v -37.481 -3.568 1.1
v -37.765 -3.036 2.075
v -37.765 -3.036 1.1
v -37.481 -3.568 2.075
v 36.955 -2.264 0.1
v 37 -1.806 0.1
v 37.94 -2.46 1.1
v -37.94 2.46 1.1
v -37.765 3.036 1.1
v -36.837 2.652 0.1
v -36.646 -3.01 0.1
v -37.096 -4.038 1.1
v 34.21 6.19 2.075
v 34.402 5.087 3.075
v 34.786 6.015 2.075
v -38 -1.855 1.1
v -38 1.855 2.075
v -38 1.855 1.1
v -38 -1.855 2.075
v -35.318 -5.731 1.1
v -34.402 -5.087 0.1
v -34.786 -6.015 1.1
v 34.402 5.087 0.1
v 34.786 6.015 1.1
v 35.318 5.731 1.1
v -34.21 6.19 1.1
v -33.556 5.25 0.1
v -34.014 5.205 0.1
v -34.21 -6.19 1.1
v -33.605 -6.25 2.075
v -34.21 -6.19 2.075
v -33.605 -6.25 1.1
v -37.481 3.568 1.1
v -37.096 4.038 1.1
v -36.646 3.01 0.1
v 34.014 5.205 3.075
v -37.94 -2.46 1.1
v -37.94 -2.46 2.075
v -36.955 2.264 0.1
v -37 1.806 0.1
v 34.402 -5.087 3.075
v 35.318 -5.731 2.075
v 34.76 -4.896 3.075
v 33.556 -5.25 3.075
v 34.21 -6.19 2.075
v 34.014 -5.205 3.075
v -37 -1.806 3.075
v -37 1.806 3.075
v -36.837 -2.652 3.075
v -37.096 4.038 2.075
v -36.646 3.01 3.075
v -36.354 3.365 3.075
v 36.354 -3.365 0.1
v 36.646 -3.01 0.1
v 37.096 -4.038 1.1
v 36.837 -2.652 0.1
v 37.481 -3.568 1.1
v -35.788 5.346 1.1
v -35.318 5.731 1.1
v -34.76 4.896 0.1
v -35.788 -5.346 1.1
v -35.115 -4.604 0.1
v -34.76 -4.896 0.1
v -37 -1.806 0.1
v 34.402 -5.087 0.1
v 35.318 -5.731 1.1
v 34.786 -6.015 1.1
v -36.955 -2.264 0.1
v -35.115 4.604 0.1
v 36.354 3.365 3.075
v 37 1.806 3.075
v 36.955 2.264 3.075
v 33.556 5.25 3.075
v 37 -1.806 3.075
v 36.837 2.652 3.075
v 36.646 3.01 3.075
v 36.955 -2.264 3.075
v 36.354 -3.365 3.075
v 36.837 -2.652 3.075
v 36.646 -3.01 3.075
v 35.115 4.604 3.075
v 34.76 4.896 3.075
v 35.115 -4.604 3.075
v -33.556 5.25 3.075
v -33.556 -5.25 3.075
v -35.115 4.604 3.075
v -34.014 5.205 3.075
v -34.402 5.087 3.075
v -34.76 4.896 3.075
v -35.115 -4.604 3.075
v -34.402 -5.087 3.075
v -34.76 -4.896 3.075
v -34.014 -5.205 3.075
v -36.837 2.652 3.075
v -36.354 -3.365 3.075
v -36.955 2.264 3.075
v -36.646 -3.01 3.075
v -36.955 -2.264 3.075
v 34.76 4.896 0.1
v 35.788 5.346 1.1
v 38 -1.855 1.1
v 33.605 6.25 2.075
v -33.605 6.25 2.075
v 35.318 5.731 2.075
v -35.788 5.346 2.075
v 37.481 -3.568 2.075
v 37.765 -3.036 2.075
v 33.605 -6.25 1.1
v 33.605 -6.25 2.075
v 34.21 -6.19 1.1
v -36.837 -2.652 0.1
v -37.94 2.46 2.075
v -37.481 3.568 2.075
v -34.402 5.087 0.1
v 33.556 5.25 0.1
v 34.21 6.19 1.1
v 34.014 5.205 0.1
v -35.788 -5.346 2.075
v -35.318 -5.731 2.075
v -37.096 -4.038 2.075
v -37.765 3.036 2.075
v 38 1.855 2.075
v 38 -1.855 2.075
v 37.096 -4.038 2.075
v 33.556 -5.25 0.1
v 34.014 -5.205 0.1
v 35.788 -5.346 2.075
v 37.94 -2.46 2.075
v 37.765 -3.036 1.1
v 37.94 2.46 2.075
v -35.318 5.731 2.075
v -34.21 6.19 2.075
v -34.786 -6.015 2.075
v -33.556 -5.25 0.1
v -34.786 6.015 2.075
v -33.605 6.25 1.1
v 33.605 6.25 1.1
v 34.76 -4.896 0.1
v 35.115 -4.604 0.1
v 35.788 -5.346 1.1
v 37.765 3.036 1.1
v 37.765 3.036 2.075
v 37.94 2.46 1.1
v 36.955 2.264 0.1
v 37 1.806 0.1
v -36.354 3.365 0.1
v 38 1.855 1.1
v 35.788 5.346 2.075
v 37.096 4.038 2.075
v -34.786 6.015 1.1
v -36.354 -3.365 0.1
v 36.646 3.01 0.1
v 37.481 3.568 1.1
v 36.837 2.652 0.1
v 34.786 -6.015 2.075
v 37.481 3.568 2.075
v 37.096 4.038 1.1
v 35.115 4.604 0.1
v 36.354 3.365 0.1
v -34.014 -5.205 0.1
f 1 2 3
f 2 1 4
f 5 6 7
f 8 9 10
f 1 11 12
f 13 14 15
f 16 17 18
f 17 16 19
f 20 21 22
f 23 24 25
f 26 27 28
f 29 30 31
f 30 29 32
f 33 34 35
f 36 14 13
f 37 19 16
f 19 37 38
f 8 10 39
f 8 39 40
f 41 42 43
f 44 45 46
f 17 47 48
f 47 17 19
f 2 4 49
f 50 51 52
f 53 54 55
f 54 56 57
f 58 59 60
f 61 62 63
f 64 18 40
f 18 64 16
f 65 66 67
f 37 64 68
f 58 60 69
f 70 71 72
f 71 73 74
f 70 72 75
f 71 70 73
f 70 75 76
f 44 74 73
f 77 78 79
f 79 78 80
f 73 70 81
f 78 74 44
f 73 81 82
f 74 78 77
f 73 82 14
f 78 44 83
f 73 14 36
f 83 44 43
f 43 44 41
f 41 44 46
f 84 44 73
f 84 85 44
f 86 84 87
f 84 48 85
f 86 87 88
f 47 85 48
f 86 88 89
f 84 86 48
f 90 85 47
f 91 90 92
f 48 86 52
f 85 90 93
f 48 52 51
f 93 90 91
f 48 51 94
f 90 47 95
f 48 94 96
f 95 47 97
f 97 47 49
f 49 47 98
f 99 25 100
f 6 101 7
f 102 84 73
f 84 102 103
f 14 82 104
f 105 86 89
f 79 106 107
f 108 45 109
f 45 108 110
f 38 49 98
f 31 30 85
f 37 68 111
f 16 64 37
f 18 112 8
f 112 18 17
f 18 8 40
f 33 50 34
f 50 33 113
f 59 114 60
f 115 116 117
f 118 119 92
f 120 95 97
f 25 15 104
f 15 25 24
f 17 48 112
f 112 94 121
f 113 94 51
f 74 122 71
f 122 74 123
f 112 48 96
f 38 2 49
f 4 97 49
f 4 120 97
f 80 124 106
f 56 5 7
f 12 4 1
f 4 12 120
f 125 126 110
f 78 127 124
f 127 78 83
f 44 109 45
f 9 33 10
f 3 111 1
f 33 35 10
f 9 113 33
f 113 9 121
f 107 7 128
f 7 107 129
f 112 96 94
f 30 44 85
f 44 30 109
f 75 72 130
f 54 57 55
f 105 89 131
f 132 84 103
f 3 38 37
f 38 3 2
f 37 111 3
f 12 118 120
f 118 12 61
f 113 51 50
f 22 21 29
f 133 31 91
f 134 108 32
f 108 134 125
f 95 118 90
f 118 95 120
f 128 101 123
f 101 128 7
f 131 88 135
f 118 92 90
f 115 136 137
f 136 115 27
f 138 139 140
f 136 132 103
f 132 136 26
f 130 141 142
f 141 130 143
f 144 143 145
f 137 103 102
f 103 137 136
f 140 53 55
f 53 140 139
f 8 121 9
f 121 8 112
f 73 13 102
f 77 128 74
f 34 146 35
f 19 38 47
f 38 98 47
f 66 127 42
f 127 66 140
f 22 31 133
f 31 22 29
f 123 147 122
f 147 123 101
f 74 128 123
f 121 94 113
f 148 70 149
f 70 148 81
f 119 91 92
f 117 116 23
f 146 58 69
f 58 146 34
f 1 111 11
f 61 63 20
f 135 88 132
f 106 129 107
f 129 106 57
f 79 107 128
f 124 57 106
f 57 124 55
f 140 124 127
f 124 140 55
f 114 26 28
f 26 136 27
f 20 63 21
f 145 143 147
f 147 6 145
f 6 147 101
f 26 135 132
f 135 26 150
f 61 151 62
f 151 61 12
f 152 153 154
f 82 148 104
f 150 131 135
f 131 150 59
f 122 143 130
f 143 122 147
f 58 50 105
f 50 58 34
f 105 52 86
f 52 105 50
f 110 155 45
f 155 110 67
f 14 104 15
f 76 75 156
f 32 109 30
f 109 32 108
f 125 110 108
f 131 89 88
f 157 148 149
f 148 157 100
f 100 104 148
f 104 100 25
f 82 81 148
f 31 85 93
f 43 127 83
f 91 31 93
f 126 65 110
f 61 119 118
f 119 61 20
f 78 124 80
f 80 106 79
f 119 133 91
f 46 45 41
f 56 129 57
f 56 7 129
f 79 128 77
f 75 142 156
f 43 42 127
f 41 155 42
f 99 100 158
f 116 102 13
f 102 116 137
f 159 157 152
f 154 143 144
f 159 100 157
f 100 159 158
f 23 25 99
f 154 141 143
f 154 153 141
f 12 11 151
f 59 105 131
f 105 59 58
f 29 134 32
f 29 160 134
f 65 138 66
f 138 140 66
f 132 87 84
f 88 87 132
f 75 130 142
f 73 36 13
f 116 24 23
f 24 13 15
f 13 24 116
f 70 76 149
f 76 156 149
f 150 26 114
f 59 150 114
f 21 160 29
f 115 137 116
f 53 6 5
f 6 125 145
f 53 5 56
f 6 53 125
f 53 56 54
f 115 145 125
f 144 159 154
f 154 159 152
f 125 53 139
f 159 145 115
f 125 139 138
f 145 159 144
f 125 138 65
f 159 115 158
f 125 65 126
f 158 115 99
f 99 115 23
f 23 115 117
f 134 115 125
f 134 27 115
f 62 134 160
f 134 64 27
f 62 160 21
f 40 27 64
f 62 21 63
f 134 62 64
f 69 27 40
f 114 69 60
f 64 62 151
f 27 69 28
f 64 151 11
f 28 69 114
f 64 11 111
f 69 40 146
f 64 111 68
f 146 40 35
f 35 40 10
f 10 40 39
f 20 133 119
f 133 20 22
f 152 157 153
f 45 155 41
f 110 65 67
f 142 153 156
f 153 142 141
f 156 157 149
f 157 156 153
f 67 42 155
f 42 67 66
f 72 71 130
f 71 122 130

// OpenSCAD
size = ["3inch", "1/2inch", "1/8inch"];

edge_bevel = "1mm";
corner_bevel = "1/8inch";

bowtie_cutout_style = "none"; // ["none","round"]
bowtie_offset = -0.10; // 0.025

$tgx11_offset = -0.1;
$fn = 36;

module edgespacer0__end_params() { }

use <../lib/RoundBowtie0.scad>
use <../lib/TGx11.1Lib.scad>
use <../lib/TOGMod1.scad>
use <../lib/TOGMod1Constructors.scad>
use <../lib/TOGPath1.scad>
use <../lib/TOGPolyhedronLib1.scad>
use <../lib/TOGUnits1.scad>
use <../lib/TOGVecLib0.scad>

$togridlib3_unit_table = tgx11_get_default_unit_table();

bowtie_cutout_2d =
	bowtie_cutout_style == "none" ? ["union"] :
	roundbowtie0_make_bowtie_2d(6.35, offset=-bowtie_offset);

size_mm = togunits1_decode_vec(size);
vbev = togunits1_decode(edge_bevel);
hbev = min(size_mm[0]*96/128, size_mm[1]*96/128, togunits1_decode(corner_bevel));
hround = hbev;

block_hull = tphl1_make_polyhedron_from_layer_function([
	[           0   -$tgx11_offset, -vbev],
	[           vbev-$tgx11_offset,  0],
   [size_mm[2]-vbev+$tgx11_offset,  0],
	[size_mm[2]     +$tgx11_offset, -vbev],
], function(zo) togvec0_offset_points(
	togpath1_rath_to_polypoints(
		togpath1_make_rectangle_rath(
			[size_mm[0], size_mm[1]],
			[["bevel", hbev], ["round", hround], ["offset", zo[1] + $tgx11_offset]]
		)
	),
	zo[0]
));

btatom = 12.7;
approximate_size_btatoms = [for(s=size_mm) round(s/btatom)];

togmod1_domodule(["difference",
   block_hull,
	
	togmod1_linear_extrude_z([-1, size_mm[2]+1], ["union",
		for( xm=[-approximate_size_btatoms[0]/2 + 0.5 : 1 : approximate_size_btatoms[0]/2] )
		["translate", [xm*btatom, -size_mm[1]/2], ["rotate", [0,0,90], bowtie_cutout_2d]]
	]),
]);
